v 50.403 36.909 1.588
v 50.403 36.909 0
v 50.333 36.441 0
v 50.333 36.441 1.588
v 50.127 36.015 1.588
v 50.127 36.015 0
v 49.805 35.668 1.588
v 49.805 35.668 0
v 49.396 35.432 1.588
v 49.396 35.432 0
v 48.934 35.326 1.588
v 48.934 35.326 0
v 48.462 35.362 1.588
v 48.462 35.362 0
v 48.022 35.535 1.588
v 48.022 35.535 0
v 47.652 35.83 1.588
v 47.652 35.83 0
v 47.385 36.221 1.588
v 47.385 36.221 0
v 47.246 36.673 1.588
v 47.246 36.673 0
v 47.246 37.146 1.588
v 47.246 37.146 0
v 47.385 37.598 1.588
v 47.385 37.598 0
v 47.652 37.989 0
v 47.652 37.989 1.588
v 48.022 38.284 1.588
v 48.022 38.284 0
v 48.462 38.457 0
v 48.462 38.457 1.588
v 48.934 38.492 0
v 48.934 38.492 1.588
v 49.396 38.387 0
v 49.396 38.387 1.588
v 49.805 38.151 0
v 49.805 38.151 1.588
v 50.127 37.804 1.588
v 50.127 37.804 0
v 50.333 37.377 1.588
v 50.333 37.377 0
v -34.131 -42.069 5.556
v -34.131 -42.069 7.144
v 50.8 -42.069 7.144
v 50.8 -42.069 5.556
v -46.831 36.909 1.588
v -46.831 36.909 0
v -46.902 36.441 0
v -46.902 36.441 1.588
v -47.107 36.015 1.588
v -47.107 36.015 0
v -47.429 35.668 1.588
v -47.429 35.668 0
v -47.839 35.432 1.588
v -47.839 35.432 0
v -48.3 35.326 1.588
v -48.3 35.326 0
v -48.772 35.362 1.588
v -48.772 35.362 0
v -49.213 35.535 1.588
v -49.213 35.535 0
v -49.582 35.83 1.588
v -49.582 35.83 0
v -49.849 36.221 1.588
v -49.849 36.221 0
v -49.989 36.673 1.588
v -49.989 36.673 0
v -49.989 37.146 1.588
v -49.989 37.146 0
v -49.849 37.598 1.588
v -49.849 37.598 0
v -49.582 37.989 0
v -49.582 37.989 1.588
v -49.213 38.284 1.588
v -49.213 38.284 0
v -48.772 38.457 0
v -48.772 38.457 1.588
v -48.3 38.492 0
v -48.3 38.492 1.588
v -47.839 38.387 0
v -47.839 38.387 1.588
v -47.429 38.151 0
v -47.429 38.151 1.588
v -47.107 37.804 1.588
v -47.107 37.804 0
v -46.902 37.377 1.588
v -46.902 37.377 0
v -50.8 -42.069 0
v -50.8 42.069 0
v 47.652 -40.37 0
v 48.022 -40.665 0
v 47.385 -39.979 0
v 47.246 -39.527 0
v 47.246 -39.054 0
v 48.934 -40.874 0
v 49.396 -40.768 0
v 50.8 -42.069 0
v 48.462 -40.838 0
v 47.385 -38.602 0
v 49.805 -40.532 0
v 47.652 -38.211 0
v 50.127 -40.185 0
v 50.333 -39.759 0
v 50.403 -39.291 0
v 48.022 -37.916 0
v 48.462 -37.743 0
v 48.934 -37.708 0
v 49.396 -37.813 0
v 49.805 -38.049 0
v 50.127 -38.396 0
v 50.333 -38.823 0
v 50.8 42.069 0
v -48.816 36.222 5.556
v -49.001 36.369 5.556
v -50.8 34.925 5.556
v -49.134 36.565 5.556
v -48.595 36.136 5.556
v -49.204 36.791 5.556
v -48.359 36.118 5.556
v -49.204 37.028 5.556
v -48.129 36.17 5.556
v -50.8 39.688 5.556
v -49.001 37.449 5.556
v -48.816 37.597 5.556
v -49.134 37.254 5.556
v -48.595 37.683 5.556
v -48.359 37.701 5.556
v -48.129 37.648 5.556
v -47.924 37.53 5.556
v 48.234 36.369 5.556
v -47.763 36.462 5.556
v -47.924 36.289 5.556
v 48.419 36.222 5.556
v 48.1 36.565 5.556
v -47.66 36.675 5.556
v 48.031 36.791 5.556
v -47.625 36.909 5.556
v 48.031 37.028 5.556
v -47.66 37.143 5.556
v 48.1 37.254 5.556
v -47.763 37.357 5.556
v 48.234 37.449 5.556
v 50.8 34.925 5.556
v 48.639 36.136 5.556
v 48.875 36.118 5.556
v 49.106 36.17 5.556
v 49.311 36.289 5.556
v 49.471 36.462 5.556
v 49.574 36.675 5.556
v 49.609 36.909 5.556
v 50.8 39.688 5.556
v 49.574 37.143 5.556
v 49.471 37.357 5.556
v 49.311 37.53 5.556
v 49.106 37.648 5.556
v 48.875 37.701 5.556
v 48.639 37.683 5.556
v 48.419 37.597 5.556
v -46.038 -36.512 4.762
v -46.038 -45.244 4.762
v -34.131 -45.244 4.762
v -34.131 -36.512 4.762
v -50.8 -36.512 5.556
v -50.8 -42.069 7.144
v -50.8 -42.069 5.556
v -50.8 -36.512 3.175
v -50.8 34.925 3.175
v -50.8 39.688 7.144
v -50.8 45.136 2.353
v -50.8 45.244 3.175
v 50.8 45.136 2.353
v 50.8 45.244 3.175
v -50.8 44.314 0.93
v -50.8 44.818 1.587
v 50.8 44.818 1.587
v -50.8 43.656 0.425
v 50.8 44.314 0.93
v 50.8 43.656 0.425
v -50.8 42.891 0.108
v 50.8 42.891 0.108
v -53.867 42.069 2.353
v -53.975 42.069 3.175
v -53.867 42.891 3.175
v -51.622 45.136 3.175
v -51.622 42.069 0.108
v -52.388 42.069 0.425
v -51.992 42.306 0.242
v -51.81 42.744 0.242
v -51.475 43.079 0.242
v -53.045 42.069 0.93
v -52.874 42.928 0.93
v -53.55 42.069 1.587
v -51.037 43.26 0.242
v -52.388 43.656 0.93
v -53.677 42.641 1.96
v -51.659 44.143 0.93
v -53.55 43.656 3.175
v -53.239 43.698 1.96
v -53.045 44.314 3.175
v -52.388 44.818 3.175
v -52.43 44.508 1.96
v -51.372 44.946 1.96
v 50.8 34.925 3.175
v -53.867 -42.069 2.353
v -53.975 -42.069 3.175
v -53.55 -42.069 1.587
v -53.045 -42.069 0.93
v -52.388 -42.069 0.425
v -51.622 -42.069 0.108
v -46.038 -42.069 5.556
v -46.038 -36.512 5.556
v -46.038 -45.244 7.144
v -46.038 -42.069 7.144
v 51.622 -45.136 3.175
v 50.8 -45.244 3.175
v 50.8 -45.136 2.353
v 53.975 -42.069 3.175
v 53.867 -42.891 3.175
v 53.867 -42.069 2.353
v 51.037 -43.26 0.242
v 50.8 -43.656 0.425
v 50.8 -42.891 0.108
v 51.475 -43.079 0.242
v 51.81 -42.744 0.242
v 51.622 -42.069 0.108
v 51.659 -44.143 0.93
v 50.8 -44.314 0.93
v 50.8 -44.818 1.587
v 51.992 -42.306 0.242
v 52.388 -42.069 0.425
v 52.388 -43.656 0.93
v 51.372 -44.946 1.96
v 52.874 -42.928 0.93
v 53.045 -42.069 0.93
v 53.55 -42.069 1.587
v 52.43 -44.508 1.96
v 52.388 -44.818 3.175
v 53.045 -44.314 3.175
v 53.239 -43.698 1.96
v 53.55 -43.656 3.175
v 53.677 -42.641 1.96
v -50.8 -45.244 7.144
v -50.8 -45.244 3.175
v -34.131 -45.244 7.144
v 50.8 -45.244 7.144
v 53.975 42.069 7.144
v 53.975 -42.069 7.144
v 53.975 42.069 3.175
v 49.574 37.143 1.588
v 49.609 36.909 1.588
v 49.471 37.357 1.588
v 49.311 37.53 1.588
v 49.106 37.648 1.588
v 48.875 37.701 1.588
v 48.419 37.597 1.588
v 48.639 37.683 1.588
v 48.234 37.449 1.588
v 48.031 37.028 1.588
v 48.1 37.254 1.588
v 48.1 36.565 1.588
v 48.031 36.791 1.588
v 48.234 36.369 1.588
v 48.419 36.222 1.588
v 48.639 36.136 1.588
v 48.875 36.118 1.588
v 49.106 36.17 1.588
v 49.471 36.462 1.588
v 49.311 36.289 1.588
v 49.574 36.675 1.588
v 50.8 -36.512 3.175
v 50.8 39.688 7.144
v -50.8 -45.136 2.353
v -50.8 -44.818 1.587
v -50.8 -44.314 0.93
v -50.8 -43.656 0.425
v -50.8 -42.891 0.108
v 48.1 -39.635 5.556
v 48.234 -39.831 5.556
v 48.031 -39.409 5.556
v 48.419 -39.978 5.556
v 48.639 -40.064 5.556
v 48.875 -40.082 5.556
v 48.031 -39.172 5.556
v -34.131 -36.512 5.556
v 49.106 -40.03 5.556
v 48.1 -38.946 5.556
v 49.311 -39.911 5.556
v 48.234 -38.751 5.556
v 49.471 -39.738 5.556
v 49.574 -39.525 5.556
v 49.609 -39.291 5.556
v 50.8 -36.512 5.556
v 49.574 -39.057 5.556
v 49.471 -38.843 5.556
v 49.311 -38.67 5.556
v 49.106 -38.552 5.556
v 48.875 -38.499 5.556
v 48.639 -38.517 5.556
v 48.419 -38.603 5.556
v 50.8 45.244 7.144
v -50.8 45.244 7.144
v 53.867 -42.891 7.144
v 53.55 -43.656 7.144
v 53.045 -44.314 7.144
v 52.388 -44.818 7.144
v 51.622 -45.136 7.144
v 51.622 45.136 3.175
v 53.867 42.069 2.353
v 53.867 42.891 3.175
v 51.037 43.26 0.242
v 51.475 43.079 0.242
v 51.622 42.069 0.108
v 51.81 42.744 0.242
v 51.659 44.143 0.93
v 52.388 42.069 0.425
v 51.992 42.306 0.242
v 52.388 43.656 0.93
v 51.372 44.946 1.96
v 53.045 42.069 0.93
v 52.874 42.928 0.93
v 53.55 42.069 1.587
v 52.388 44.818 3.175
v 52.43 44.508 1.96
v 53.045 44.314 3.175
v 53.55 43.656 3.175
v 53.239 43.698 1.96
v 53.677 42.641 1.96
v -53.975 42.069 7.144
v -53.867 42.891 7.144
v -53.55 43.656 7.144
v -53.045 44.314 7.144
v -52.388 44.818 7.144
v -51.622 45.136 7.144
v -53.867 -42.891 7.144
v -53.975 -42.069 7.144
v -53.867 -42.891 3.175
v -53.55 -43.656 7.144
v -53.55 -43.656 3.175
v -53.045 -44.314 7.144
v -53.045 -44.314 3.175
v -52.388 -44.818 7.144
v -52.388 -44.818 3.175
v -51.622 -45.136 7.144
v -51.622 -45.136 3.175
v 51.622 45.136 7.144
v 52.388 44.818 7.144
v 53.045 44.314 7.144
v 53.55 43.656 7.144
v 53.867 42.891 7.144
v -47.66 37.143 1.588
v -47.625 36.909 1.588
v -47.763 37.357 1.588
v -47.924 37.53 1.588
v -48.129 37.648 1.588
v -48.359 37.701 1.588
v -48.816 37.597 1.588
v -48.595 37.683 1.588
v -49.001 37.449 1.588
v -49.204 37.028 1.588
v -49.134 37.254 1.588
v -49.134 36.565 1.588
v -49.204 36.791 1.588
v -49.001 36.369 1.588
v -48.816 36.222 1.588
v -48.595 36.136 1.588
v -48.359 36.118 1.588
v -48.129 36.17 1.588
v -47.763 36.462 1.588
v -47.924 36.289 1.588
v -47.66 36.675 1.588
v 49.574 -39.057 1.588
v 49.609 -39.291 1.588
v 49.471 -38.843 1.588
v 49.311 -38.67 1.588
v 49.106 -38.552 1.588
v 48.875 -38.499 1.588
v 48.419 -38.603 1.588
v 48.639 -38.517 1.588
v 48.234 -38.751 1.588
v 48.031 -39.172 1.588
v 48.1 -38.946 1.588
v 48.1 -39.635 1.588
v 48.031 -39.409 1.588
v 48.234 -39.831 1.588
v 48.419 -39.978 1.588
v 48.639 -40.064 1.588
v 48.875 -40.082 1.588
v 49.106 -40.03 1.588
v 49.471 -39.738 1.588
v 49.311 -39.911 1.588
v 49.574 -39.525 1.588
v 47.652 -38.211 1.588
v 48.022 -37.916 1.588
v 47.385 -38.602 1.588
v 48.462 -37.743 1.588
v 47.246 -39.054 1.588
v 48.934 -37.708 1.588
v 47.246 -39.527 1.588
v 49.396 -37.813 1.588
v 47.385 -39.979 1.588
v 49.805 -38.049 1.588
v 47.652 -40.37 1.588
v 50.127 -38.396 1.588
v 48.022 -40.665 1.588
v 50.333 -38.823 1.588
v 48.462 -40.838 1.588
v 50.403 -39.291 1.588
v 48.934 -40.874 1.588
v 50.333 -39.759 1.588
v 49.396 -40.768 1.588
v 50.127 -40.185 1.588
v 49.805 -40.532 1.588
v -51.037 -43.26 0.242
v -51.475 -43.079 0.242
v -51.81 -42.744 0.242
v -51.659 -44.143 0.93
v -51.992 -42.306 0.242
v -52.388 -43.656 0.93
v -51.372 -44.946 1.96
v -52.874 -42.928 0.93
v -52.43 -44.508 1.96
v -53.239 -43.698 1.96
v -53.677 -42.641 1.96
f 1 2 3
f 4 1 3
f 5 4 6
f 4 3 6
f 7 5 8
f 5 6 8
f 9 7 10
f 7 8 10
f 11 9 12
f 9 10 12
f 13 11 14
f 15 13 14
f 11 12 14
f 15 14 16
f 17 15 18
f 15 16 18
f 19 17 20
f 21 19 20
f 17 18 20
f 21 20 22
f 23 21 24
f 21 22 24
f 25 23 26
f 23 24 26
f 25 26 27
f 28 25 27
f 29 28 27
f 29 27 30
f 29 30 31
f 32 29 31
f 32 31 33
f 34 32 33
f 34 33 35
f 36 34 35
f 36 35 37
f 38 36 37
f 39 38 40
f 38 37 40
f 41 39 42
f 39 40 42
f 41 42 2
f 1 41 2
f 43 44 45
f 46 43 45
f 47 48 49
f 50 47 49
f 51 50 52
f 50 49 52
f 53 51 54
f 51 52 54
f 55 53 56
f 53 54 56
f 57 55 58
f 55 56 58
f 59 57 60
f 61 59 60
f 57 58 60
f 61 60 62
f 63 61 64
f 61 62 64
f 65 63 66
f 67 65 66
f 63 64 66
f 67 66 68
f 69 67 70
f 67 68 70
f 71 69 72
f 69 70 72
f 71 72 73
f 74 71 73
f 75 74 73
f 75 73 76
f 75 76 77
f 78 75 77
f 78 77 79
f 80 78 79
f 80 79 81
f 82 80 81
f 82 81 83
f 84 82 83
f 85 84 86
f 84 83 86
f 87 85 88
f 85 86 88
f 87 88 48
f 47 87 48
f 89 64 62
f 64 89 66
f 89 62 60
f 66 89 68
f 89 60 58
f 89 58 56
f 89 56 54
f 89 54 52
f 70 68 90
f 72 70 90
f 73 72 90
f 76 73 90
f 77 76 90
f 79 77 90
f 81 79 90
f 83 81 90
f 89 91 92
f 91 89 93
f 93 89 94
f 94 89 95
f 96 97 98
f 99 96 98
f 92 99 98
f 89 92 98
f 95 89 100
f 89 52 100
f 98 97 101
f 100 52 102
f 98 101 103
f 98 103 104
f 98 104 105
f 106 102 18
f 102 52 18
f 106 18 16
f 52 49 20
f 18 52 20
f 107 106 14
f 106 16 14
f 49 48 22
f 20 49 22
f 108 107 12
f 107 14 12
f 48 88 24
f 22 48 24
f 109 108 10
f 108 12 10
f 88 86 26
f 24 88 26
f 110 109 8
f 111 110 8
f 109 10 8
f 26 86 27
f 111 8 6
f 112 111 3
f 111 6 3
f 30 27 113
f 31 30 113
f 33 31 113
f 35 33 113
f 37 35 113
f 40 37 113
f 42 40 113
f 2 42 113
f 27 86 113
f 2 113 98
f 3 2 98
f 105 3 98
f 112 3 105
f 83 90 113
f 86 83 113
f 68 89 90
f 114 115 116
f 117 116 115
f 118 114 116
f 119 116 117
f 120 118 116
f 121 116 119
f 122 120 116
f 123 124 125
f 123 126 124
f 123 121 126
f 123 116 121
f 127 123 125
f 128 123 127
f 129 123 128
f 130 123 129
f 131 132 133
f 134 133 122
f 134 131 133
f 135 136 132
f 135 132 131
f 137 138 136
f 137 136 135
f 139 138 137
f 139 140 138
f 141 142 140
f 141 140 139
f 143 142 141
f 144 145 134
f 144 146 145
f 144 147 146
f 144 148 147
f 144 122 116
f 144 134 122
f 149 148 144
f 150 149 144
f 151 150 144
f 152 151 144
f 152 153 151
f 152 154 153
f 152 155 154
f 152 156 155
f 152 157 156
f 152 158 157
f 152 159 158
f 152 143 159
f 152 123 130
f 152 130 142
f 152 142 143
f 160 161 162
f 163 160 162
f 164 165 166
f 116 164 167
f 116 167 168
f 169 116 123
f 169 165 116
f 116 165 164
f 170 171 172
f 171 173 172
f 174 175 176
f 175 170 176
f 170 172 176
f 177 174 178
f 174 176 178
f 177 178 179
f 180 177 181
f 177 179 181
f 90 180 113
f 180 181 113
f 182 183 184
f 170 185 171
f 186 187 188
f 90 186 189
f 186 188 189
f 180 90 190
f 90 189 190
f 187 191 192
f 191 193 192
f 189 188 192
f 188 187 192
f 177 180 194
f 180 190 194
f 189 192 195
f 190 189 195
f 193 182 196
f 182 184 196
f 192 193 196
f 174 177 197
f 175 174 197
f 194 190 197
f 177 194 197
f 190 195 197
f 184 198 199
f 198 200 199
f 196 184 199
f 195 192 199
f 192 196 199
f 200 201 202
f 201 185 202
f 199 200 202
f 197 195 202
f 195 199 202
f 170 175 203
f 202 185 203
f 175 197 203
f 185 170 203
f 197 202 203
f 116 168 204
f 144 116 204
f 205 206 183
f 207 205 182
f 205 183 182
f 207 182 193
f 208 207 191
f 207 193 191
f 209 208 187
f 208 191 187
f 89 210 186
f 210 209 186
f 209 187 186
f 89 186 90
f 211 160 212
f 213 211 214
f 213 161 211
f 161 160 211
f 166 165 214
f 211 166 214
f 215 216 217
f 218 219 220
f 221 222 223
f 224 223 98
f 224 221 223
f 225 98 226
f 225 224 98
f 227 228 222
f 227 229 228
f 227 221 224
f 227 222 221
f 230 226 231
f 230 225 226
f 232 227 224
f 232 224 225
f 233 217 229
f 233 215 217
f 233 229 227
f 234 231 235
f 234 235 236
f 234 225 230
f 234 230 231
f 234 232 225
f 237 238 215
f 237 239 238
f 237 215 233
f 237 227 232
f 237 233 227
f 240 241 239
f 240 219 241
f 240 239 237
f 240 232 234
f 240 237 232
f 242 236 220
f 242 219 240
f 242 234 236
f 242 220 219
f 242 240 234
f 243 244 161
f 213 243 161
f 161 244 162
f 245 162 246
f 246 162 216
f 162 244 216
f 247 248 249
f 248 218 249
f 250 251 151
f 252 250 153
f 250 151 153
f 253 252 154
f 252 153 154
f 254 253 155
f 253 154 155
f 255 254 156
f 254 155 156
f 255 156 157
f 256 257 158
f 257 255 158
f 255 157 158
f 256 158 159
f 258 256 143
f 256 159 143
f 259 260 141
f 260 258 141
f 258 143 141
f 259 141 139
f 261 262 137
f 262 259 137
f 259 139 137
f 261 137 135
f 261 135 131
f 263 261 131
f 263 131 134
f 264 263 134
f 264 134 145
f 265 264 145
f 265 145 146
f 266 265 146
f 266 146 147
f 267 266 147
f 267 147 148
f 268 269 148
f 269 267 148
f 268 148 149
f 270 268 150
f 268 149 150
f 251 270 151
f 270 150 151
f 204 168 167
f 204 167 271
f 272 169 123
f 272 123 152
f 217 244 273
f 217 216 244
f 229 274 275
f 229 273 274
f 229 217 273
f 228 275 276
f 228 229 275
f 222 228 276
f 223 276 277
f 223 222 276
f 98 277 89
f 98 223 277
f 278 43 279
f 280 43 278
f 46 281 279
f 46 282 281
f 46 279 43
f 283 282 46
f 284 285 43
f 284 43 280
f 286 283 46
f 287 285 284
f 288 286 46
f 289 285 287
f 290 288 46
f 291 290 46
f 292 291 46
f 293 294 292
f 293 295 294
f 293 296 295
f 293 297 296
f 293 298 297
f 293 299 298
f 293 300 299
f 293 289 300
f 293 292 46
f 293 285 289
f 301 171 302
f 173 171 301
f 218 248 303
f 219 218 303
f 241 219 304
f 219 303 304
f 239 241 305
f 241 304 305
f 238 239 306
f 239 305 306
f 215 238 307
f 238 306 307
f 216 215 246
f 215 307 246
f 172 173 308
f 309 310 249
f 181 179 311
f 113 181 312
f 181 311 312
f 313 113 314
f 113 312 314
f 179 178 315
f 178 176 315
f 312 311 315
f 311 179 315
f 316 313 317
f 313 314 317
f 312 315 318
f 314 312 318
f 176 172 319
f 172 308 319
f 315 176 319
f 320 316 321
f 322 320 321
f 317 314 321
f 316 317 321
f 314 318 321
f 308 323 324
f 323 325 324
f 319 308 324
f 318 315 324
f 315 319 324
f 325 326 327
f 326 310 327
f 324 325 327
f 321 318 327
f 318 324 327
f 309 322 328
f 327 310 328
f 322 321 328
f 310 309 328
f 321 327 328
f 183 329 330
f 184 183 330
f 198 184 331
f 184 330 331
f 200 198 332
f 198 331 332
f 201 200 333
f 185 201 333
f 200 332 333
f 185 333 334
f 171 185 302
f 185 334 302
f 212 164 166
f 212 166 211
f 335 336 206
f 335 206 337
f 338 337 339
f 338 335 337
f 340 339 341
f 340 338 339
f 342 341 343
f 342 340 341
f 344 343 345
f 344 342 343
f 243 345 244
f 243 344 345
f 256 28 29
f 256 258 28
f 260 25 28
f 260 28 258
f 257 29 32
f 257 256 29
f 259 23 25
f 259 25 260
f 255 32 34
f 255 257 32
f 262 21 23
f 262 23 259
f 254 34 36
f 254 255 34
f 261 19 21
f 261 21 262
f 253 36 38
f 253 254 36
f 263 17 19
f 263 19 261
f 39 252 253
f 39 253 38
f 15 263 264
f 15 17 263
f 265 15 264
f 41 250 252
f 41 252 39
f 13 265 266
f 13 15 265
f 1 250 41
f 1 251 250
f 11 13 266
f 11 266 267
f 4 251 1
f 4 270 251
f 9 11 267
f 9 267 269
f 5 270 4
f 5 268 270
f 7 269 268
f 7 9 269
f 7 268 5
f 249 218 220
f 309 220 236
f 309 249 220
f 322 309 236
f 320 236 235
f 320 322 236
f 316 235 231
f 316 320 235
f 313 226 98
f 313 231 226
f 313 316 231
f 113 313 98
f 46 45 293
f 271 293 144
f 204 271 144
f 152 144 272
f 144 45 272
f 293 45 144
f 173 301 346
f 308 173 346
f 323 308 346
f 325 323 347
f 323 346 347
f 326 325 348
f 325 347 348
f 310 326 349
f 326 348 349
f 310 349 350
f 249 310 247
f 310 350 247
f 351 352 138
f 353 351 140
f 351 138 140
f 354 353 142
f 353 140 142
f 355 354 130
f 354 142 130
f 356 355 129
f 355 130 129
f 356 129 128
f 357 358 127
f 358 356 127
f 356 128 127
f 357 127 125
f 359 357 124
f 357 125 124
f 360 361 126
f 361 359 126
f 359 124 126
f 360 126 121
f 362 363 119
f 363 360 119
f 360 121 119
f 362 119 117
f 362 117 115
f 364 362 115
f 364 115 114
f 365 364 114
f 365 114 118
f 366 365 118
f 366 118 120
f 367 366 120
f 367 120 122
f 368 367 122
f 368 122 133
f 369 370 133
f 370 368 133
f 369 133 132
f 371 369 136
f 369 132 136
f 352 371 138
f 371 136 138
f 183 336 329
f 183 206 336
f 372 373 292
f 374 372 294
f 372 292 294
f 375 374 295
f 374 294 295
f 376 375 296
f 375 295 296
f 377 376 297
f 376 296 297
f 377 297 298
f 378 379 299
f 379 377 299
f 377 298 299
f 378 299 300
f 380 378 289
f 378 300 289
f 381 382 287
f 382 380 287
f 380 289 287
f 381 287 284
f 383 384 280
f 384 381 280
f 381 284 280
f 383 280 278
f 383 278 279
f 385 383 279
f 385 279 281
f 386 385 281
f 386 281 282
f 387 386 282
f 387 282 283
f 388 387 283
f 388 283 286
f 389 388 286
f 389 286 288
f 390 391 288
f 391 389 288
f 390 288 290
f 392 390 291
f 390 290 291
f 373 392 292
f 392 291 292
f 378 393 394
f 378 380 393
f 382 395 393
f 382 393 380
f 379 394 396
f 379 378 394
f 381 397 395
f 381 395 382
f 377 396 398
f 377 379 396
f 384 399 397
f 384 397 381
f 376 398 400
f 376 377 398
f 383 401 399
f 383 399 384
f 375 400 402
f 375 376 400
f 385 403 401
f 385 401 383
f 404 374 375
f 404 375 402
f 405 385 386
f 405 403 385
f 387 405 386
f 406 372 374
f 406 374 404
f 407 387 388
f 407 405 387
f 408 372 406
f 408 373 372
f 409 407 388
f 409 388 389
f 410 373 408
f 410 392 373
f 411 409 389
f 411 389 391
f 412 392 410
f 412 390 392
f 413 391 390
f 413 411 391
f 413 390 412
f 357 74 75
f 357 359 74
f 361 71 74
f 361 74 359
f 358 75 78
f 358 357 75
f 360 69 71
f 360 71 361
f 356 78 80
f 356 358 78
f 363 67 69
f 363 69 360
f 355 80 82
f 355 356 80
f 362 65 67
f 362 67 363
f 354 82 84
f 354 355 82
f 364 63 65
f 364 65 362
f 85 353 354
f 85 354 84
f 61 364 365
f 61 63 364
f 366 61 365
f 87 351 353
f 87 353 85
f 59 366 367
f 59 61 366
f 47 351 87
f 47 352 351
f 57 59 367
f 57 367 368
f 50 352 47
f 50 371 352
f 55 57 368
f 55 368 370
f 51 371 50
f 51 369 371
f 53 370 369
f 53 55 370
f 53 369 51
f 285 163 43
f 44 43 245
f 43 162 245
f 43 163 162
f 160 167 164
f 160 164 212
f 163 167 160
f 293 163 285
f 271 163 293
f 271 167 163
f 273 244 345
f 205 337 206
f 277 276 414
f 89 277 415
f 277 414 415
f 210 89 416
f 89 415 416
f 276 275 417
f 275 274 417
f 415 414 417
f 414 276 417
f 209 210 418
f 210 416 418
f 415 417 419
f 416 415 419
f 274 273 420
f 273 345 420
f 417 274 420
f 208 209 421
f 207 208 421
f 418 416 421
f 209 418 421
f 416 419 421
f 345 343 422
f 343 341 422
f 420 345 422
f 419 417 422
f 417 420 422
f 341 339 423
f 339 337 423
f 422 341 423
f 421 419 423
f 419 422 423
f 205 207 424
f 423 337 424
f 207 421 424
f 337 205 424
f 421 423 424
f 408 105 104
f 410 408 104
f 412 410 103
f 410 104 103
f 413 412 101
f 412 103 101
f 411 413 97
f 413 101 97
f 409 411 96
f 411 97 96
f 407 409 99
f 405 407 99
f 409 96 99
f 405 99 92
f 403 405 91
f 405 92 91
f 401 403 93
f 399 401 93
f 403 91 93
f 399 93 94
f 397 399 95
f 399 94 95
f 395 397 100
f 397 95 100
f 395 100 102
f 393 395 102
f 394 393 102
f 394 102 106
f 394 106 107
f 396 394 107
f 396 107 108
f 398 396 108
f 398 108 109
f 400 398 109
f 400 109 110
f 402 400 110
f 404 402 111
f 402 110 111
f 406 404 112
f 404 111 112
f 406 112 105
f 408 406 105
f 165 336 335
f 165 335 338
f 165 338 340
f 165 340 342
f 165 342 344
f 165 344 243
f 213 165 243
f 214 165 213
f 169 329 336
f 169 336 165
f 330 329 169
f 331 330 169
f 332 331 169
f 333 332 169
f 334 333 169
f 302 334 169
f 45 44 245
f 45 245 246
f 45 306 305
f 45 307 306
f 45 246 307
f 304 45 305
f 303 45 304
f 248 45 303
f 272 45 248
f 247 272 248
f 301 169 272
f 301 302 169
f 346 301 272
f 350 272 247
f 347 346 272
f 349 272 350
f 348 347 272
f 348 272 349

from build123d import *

# Parameters (mm, degrees)
F0_W      = 107.95
F0_H      = 90.4875
F1_DEPTH  = 7.14375
F2_W      = 101.6
F2_H      = 81.75625
F3_DEPTH  = 3.96875
F4_W      = 101.6
F4_H      = 4.7625
F4_H_2    = 5.55625
F5_DEPTH  = 2.38125
F6_W      = 11.90625
F6_H      = 2.38125
F7_DEPTH  = 25.4
F8_R      = 0.79375
F9_DEPTH  = 25.4
F10_R     = 3.175
F11_R     = 1.5875
F11_R_2   = 0.79375
F12_DEPTH = 1.5875


with BuildPart() as f1:
    # F0 (on Top) → F1 (new body)
    with BuildSketch(Plane.XY):
        Rectangle(F0_W, F0_H)
    extrude(amount=F1_DEPTH)

    # F2 (on face) → F3 (cut)
    with BuildSketch(Plane.XY.offset(7.14375)):
        with Locations((0, -1.190625)):
            Rectangle(F2_W, F2_H)
    extrude(amount=-F3_DEPTH, mode=Mode.SUBTRACT)

    # F4 (on face) → F5 (join)
    with BuildSketch(Plane.XY.offset(3.175)):
        with Locations((0, 37.30625)):
            Rectangle(F4_W, F4_H)
        with Locations((0, -39.290625)):
            Rectangle(F4_W, F4_H_2)
    extrude(amount=F5_DEPTH)

    # F6 (on face) → F7 (cut)
    with BuildSketch(Plane.XZ.offset(45.24375)):
        with Locations((-40.084375, 5.953125)):
            Rectangle(F6_W, F6_H)
    extrude(amount=-F7_DEPTH, mode=Mode.SUBTRACT)

    # F8 (on face) → F9 (cut)
    with BuildSketch(Plane.XY.offset(5.55625)):
        with Locations((48.815625, 36.909375)):
            Circle(F8_R)
        with Locations((48.815625, -39.290625)):
            Circle(F8_R)
        with Locations((-48.41875, 36.909375)):
            Circle(F8_R)
    extrude(amount=-F9_DEPTH, mode=Mode.SUBTRACT)

    # F10
    f10_edges = [f1.edges().sort_by_distance(p)[0] for p in [
        (53.975, -45.24375, 3.571875),
        (53.975, 45.24375, 3.571875),
        (-53.975, 45.24375, 3.571875),
        (-53.975, -45.24375, 3.571875),
        (0, -45.24375, 0),
        (-53.975, 0, 0),
        (0, 45.24375, 0),
        (53.975, 0, 0),
    ]]
    fillet(f10_edges, radius=F10_R)

    # F11 (on face) → F12 (cut)
    with BuildSketch(Plane(origin=(0, 0, 0), x_dir=(1, 0, 0), z_dir=(0, 0, -1))):
        with Locations((-48.41875, -36.909375)):
            Circle(F11_R)
        with Locations((-48.41875, -36.909375)):
            Circle(F11_R_2, mode=Mode.SUBTRACT)
        with Locations((48.815625, -36.909375)):
            Circle(F11_R)
        with Locations((48.815625, -36.909375)):
            Circle(F11_R_2, mode=Mode.SUBTRACT)
        with Locations((48.815625, 39.290625)):
            Circle(F11_R)
        with Locations((48.815625, 39.290625)):
            Circle(F11_R_2, mode=Mode.SUBTRACT)
    extrude(amount=-F12_DEPTH, mode=Mode.SUBTRACT)


solid = f1.part
